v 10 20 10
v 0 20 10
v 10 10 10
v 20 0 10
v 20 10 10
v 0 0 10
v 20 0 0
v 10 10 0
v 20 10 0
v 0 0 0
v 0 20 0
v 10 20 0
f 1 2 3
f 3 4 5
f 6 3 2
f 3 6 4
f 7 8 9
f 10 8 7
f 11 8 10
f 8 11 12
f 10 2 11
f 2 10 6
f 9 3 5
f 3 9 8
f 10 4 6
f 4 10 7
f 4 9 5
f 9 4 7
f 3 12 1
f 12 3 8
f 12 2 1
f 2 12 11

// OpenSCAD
color("red") cube(10);
color("red") translate([10,0,0]) cube(10);
color("blue") translate([0,10,0]) cube(10);
